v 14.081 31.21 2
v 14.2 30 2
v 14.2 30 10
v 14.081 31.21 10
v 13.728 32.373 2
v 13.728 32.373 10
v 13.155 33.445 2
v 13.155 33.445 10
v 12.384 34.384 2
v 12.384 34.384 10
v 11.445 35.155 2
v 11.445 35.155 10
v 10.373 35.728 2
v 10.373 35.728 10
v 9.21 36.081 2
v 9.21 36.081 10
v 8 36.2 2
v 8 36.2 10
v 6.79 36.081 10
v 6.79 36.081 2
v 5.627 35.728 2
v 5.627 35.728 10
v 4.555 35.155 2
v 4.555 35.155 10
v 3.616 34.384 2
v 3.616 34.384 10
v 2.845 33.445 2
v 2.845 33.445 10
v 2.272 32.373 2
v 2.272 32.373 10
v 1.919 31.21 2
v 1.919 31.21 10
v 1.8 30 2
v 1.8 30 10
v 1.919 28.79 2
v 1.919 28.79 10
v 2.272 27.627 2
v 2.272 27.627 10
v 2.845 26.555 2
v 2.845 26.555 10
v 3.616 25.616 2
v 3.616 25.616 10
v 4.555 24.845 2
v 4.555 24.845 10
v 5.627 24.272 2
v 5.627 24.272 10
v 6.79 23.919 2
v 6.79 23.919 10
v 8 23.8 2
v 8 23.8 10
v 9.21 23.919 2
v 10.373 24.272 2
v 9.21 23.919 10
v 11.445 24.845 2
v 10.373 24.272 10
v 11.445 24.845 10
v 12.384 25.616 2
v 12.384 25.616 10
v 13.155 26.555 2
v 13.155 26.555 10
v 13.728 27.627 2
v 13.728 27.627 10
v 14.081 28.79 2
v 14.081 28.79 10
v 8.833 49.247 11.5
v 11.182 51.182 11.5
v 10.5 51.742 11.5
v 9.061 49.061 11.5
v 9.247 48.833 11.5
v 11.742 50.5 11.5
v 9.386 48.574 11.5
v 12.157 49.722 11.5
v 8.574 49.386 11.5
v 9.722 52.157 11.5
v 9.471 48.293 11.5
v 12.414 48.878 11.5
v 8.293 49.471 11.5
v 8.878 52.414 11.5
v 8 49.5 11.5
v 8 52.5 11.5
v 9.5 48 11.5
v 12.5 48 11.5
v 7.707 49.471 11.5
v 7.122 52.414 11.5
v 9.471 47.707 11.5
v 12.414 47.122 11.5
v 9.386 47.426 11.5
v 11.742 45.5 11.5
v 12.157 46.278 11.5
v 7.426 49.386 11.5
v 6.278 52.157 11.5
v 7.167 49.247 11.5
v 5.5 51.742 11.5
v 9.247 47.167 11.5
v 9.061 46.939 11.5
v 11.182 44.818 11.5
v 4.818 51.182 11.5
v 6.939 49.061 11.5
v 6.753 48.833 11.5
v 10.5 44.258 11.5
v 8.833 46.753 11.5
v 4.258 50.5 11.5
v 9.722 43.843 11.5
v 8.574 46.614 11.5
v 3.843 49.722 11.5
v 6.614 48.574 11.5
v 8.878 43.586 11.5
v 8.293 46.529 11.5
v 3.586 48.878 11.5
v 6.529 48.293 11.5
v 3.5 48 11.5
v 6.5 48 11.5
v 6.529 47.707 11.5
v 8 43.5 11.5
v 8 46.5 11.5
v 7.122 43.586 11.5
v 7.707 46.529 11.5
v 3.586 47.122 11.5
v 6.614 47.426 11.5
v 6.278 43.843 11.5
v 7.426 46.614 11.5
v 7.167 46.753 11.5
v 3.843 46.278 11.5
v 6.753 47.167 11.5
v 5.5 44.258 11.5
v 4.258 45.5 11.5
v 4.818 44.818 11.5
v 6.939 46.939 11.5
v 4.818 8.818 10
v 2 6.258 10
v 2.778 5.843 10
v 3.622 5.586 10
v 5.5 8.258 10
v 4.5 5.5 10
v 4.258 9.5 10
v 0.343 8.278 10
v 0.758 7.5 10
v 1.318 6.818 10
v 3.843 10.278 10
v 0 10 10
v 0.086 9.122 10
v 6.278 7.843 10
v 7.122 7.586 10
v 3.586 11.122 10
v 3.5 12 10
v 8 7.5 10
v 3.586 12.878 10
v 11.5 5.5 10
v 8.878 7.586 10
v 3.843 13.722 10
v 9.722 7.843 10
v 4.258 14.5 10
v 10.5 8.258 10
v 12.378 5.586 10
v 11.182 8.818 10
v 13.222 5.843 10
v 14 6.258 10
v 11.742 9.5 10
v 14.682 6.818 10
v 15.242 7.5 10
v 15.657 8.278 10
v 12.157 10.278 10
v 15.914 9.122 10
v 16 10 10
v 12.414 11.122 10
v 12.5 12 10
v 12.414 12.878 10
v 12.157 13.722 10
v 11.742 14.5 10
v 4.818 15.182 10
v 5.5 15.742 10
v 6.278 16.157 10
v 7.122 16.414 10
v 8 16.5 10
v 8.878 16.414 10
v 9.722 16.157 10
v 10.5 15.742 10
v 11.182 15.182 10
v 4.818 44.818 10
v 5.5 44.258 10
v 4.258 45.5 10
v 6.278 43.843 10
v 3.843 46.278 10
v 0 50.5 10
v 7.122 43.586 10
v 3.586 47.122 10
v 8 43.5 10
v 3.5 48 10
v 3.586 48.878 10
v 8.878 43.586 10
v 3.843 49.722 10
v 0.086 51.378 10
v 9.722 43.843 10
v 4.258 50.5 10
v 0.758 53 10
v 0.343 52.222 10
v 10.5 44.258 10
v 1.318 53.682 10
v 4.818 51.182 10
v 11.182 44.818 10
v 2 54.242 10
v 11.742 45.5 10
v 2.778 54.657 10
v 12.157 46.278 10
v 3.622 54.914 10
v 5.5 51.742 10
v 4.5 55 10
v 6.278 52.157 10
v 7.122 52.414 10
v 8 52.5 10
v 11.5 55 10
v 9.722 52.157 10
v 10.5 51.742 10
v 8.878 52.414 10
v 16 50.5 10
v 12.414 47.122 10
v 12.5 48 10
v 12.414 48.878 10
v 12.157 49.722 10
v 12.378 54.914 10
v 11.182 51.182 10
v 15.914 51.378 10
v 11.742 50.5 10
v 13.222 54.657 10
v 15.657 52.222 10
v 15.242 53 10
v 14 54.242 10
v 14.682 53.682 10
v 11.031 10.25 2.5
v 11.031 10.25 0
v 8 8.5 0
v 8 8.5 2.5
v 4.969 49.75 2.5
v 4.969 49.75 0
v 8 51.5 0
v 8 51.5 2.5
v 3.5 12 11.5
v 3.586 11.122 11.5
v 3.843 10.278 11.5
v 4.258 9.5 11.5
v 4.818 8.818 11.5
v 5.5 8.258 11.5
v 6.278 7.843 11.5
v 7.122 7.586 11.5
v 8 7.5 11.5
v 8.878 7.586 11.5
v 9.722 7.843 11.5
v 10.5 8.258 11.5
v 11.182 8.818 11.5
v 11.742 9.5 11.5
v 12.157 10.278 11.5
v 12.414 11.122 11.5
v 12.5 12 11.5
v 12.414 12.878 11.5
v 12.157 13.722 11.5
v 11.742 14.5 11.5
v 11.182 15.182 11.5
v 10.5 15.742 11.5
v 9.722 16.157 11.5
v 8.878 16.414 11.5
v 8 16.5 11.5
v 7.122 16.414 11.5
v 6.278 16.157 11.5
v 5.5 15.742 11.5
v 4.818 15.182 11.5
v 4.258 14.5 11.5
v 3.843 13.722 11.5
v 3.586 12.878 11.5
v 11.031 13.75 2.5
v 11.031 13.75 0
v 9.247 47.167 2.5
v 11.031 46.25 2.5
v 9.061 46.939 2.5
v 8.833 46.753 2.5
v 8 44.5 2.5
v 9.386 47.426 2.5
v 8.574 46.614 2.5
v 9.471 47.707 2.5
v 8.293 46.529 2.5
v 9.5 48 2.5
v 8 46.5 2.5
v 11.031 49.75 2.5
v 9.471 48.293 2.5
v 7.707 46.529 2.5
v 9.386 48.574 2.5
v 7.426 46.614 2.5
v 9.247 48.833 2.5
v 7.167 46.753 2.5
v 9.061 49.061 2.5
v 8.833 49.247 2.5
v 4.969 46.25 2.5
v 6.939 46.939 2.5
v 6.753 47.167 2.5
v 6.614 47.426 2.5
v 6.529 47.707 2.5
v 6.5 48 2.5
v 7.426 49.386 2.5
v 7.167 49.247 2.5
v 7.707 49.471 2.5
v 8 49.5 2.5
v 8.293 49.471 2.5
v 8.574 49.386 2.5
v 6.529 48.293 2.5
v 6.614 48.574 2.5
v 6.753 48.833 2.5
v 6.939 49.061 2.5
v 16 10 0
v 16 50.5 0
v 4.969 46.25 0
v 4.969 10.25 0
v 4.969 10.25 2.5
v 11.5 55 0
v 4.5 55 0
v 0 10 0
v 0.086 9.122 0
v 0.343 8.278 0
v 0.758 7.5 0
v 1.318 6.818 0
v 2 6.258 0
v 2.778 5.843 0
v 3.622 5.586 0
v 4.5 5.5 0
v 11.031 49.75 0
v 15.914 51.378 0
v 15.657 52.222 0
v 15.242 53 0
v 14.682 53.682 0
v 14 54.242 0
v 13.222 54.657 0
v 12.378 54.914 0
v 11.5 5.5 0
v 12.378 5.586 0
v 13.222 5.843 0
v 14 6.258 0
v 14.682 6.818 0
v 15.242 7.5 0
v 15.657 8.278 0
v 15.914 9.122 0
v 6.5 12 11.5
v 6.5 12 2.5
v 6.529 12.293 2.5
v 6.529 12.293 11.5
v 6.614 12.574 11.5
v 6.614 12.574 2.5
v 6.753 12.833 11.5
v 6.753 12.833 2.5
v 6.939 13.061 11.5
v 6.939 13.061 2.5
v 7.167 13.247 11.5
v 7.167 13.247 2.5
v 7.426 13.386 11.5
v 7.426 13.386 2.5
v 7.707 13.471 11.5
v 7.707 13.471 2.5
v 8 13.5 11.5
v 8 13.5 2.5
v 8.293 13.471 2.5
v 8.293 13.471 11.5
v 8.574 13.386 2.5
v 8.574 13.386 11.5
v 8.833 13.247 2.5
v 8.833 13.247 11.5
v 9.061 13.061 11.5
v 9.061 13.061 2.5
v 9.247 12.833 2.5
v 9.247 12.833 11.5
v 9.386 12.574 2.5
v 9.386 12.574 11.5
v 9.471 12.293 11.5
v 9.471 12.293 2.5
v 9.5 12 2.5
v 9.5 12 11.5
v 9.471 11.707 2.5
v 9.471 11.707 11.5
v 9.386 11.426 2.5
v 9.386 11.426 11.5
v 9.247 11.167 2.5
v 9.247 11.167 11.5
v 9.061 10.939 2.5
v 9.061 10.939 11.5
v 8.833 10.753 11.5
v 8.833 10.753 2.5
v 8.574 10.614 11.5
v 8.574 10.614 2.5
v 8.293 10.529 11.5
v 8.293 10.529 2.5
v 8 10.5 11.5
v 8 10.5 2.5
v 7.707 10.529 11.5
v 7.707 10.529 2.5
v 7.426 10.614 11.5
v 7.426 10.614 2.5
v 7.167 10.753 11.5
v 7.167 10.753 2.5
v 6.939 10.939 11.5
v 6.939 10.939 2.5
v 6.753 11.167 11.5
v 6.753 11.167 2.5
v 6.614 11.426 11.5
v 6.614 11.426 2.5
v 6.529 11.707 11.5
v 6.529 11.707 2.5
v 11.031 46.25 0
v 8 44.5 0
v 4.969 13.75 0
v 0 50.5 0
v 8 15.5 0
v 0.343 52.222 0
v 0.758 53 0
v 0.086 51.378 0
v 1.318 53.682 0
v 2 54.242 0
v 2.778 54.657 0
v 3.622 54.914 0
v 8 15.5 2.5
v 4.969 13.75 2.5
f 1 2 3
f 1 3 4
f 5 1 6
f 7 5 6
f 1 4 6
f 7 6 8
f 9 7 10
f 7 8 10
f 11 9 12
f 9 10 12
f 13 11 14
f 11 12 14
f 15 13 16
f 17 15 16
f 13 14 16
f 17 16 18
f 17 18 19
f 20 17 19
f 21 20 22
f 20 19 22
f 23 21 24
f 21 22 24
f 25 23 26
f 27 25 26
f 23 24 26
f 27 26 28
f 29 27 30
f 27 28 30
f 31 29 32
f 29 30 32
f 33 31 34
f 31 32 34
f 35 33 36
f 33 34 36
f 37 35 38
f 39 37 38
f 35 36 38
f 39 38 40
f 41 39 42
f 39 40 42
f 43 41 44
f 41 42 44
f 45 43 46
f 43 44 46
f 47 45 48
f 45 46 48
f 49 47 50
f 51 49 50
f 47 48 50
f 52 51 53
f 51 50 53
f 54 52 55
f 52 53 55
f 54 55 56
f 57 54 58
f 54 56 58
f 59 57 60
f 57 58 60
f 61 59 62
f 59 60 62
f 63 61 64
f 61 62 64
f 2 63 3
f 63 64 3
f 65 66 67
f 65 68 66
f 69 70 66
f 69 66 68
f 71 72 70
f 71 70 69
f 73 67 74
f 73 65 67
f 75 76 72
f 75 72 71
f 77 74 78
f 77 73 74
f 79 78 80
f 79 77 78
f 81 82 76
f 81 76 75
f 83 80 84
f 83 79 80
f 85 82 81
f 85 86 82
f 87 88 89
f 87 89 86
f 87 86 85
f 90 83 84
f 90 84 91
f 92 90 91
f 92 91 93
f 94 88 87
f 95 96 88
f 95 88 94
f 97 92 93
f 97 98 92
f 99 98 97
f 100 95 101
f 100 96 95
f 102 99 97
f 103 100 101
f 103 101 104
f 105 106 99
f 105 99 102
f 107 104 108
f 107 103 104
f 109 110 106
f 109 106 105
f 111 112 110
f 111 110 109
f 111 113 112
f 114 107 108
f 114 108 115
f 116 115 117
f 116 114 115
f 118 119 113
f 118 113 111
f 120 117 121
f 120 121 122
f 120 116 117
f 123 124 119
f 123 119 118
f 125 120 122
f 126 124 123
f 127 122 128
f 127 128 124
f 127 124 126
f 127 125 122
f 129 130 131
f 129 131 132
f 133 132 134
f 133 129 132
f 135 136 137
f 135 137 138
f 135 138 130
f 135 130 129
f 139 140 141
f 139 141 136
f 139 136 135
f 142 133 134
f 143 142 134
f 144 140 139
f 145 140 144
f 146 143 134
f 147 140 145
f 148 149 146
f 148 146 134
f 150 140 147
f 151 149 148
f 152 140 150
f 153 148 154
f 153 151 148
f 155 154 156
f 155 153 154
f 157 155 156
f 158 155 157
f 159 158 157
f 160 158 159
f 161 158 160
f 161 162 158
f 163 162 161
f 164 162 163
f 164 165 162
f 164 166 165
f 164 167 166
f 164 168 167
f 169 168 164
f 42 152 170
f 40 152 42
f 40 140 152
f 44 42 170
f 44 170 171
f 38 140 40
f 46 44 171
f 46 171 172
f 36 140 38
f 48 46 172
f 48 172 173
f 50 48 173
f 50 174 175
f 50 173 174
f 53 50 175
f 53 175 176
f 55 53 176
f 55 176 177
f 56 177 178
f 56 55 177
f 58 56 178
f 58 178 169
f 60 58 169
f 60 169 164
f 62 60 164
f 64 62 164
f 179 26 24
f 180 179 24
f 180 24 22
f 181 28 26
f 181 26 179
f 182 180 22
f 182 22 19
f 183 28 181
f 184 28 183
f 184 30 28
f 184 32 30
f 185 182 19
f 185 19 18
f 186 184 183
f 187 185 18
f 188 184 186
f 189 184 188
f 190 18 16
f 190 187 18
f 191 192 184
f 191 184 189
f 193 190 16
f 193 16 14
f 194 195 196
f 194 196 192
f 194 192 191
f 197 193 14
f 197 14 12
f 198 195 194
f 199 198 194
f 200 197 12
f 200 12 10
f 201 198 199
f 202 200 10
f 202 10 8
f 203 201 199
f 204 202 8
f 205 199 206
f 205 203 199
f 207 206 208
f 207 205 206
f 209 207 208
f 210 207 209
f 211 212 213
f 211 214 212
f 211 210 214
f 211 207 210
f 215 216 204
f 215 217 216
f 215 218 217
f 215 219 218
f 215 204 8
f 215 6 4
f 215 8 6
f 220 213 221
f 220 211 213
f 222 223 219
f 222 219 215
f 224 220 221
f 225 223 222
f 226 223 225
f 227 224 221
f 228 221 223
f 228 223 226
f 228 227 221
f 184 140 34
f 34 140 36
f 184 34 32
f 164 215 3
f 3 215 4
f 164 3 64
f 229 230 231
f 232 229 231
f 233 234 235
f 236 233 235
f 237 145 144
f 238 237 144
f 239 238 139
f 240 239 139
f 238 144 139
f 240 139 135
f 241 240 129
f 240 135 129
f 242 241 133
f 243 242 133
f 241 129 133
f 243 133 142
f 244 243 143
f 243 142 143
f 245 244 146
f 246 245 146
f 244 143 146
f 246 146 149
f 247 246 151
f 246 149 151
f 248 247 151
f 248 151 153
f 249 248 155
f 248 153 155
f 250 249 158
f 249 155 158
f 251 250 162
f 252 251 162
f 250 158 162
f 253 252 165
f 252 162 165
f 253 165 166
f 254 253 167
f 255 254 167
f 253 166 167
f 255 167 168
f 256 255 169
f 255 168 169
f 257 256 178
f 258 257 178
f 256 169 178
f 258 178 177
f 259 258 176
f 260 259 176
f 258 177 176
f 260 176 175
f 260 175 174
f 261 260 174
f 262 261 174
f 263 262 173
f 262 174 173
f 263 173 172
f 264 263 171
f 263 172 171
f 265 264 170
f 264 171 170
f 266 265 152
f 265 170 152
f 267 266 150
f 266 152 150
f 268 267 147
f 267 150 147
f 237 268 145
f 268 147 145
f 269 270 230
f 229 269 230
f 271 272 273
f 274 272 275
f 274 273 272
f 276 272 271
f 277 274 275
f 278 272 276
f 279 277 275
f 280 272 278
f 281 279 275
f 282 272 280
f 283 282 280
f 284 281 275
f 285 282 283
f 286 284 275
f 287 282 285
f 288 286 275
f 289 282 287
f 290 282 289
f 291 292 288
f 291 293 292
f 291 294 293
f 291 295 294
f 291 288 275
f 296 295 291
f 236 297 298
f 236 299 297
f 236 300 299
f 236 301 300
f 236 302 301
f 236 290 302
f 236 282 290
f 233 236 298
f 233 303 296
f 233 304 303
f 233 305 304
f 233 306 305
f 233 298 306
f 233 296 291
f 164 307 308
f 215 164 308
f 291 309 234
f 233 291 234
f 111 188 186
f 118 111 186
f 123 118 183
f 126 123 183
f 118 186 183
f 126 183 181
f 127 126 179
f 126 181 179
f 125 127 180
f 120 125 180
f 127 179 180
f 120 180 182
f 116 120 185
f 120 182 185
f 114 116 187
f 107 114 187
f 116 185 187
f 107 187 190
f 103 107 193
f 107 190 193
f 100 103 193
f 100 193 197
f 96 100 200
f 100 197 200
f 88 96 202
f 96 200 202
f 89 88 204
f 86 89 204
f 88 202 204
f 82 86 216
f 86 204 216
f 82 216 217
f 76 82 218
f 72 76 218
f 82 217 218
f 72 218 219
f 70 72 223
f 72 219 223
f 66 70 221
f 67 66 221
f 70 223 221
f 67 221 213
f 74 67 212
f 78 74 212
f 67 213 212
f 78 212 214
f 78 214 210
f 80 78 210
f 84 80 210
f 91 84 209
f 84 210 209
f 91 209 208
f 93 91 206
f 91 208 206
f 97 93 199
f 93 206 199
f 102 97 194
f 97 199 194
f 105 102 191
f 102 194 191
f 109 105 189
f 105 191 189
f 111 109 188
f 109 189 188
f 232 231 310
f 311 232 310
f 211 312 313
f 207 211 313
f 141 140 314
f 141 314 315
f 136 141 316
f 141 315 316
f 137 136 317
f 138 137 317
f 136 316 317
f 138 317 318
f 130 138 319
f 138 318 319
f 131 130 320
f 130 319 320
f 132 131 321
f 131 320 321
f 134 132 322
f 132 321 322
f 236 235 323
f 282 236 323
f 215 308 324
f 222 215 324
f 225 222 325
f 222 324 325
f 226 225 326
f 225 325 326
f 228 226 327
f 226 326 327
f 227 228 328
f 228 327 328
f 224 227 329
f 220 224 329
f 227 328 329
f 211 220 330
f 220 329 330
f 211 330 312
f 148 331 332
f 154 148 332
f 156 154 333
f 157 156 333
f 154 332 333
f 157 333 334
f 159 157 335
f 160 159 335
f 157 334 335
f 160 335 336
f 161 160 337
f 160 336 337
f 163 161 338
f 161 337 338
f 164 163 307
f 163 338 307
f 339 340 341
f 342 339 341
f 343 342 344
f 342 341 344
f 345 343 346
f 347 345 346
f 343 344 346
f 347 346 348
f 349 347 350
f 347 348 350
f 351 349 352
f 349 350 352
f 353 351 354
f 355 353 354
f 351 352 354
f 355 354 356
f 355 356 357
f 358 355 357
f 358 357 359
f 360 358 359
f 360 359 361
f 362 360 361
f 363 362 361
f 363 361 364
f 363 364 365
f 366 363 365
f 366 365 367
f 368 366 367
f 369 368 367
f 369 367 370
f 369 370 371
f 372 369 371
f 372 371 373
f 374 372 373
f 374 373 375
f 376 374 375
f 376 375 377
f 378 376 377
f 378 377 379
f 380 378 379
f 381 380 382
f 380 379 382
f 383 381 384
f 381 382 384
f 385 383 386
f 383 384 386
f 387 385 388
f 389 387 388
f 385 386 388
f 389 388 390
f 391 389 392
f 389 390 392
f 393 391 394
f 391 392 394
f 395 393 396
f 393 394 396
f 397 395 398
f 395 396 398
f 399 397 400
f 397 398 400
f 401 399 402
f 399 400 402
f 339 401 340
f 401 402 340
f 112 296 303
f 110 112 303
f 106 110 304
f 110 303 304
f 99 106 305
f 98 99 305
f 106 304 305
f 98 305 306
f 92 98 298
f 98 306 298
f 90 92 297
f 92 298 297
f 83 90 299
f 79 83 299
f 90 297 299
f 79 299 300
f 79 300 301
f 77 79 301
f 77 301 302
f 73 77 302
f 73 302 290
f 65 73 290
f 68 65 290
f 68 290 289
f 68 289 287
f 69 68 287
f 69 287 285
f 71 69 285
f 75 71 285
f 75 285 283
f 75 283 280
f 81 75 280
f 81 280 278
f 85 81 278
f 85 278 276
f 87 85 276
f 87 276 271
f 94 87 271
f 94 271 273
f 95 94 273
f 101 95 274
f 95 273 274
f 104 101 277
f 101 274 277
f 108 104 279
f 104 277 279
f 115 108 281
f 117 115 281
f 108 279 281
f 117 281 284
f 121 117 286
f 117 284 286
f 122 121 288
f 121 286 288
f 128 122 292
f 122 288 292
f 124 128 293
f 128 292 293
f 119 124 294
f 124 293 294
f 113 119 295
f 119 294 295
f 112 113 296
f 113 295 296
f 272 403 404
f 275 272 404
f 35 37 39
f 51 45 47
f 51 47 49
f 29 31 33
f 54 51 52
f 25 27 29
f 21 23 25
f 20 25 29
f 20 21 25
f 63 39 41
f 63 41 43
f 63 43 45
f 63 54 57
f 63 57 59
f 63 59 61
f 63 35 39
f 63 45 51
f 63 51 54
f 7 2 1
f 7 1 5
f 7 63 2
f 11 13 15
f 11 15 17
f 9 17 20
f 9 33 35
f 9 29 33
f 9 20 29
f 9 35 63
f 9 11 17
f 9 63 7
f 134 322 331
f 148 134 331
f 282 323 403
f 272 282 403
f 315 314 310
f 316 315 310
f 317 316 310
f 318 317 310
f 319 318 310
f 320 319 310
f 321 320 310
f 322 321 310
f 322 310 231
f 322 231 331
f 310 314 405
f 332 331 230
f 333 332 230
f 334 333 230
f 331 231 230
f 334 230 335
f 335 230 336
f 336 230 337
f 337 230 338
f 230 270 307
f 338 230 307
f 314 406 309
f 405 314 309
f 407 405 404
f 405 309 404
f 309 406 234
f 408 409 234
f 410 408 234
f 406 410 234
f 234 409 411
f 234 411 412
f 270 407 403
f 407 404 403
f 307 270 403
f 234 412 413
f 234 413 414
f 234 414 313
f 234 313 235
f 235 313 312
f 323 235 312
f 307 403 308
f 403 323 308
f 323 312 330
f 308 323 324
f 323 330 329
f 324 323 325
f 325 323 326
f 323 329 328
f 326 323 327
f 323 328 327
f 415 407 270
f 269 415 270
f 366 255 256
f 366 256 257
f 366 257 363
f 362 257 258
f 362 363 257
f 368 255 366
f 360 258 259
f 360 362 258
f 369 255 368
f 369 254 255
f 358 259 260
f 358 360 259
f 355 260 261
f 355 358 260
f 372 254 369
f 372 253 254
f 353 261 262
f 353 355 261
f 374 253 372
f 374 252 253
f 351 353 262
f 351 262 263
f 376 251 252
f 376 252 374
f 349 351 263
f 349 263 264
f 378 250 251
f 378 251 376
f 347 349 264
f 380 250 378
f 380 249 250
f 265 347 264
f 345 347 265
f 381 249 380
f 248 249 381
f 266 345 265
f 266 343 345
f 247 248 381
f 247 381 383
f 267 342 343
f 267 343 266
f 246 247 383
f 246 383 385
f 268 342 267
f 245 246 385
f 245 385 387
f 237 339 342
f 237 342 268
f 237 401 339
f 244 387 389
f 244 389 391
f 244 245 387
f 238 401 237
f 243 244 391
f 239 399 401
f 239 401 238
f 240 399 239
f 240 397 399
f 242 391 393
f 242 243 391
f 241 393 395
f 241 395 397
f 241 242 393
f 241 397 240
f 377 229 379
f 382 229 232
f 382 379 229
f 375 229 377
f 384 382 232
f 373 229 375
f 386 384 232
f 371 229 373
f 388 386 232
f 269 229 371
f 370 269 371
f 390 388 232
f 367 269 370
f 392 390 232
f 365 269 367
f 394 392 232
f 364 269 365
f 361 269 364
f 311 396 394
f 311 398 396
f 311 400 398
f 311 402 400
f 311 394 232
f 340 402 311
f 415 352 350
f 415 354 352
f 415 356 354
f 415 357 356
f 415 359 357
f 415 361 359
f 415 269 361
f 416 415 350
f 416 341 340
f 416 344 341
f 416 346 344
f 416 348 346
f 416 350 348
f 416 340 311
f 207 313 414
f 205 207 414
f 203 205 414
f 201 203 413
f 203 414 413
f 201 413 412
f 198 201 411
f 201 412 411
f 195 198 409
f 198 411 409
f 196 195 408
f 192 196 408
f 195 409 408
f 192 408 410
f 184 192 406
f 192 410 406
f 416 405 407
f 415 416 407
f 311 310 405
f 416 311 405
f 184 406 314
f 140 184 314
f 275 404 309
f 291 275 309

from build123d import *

# Parameters (mm, degrees)
SALIENTE_EXTRUIR1_DEPTH = 10
CORTAR_EXTRUIR2_DEPTH   = 2.5
CROQUIS3_R              = 4.5
SALIENTE_EXTRUIR2_DEPTH = 1.5
CROQUIS4_R              = 1.5
CORTAR_EXTRUIR3_DEPTH   = 58.982756057
CROQUIS5_R              = 6.2
CORTAR_EXTRUIR4_DEPTH   = 8


with BuildPart() as part:
    # Croquis1 → Saliente-Extruir1 (new body)
    with BuildSketch(Plane(origin=(0, 0, 0), x_dir=(-1, 0, 0), z_dir=(0, 0, -1))):
        with BuildLine():
            Line((-11.5, 55), (-4.5, 55))
            ThreePointArc((-4.5, 55), (-1.318019485, 53.681980515), (0, 50.5))
            Line((0, 50.5), (0, 10))
            ThreePointArc((0, 10), (-1.318019485, 6.818019485), (-4.5, 5.5))
            Line((-4.5, 5.5), (-11.5, 5.5))
            ThreePointArc((-11.5, 5.5), (-14.681980515, 6.818019485), (-16, 10))
            Line((-16, 10), (-16, 50.5))
            ThreePointArc((-16, 50.5), (-14.681980515, 53.681980515), (-11.5, 55))
        make_face()
    extrude(amount=-SALIENTE_EXTRUIR1_DEPTH)

    # Croquis2 → Cortar-Extruir2 (cut)
    with BuildSketch(Plane(origin=(0, 0, 0), x_dir=(-1, 0, 0), z_dir=(0, 0, -1))):
        Polygon((-8, 51.5), (-11.031088913, 49.75), (-11.031088913, 46.25), (-8, 44.5), (-4.968911087, 46.25), (-4.968911087, 49.75), align=None)
        Polygon((-8, 15.5), (-11.031088913, 13.75), (-11.031088913, 10.25), (-8, 8.5), (-4.968911087, 10.25), (-4.968911087, 13.75), align=None)
    extrude(amount=-CORTAR_EXTRUIR2_DEPTH, mode=Mode.SUBTRACT)

    # Croquis3 → Saliente-Extruir2 (add)
    with BuildSketch(Plane.XY.offset(10)):
        with Locations(Location((8, 48, 0), (0, 0, 180))):
            Circle(CROQUIS3_R)
        with Locations(Location((8, 12, 0), (0, 0, 180))):
            Circle(CROQUIS3_R)
    extrude(amount=SALIENTE_EXTRUIR2_DEPTH)

    # Croquis4 → Cortar-Extruir3 (cut, through all)
    with BuildSketch(Plane(origin=(0, 0, 2.5), x_dir=(-1, 0, 0), z_dir=(0, 0, -1))):
        with Locations((-8, 48)):
            Circle(CROQUIS4_R)
        with Locations((-8, 12)):
            Circle(CROQUIS4_R)
    extrude(amount=-CORTAR_EXTRUIR3_DEPTH, mode=Mode.SUBTRACT)

    # Croquis5 → Cortar-Extruir4 (cut)
    with BuildSketch(Plane.XY.offset(10)):
        with Locations((8, 30)):
            Circle(CROQUIS5_R)
    extrude(amount=-CORTAR_EXTRUIR4_DEPTH, mode=Mode.SUBTRACT)


solid = part.part
